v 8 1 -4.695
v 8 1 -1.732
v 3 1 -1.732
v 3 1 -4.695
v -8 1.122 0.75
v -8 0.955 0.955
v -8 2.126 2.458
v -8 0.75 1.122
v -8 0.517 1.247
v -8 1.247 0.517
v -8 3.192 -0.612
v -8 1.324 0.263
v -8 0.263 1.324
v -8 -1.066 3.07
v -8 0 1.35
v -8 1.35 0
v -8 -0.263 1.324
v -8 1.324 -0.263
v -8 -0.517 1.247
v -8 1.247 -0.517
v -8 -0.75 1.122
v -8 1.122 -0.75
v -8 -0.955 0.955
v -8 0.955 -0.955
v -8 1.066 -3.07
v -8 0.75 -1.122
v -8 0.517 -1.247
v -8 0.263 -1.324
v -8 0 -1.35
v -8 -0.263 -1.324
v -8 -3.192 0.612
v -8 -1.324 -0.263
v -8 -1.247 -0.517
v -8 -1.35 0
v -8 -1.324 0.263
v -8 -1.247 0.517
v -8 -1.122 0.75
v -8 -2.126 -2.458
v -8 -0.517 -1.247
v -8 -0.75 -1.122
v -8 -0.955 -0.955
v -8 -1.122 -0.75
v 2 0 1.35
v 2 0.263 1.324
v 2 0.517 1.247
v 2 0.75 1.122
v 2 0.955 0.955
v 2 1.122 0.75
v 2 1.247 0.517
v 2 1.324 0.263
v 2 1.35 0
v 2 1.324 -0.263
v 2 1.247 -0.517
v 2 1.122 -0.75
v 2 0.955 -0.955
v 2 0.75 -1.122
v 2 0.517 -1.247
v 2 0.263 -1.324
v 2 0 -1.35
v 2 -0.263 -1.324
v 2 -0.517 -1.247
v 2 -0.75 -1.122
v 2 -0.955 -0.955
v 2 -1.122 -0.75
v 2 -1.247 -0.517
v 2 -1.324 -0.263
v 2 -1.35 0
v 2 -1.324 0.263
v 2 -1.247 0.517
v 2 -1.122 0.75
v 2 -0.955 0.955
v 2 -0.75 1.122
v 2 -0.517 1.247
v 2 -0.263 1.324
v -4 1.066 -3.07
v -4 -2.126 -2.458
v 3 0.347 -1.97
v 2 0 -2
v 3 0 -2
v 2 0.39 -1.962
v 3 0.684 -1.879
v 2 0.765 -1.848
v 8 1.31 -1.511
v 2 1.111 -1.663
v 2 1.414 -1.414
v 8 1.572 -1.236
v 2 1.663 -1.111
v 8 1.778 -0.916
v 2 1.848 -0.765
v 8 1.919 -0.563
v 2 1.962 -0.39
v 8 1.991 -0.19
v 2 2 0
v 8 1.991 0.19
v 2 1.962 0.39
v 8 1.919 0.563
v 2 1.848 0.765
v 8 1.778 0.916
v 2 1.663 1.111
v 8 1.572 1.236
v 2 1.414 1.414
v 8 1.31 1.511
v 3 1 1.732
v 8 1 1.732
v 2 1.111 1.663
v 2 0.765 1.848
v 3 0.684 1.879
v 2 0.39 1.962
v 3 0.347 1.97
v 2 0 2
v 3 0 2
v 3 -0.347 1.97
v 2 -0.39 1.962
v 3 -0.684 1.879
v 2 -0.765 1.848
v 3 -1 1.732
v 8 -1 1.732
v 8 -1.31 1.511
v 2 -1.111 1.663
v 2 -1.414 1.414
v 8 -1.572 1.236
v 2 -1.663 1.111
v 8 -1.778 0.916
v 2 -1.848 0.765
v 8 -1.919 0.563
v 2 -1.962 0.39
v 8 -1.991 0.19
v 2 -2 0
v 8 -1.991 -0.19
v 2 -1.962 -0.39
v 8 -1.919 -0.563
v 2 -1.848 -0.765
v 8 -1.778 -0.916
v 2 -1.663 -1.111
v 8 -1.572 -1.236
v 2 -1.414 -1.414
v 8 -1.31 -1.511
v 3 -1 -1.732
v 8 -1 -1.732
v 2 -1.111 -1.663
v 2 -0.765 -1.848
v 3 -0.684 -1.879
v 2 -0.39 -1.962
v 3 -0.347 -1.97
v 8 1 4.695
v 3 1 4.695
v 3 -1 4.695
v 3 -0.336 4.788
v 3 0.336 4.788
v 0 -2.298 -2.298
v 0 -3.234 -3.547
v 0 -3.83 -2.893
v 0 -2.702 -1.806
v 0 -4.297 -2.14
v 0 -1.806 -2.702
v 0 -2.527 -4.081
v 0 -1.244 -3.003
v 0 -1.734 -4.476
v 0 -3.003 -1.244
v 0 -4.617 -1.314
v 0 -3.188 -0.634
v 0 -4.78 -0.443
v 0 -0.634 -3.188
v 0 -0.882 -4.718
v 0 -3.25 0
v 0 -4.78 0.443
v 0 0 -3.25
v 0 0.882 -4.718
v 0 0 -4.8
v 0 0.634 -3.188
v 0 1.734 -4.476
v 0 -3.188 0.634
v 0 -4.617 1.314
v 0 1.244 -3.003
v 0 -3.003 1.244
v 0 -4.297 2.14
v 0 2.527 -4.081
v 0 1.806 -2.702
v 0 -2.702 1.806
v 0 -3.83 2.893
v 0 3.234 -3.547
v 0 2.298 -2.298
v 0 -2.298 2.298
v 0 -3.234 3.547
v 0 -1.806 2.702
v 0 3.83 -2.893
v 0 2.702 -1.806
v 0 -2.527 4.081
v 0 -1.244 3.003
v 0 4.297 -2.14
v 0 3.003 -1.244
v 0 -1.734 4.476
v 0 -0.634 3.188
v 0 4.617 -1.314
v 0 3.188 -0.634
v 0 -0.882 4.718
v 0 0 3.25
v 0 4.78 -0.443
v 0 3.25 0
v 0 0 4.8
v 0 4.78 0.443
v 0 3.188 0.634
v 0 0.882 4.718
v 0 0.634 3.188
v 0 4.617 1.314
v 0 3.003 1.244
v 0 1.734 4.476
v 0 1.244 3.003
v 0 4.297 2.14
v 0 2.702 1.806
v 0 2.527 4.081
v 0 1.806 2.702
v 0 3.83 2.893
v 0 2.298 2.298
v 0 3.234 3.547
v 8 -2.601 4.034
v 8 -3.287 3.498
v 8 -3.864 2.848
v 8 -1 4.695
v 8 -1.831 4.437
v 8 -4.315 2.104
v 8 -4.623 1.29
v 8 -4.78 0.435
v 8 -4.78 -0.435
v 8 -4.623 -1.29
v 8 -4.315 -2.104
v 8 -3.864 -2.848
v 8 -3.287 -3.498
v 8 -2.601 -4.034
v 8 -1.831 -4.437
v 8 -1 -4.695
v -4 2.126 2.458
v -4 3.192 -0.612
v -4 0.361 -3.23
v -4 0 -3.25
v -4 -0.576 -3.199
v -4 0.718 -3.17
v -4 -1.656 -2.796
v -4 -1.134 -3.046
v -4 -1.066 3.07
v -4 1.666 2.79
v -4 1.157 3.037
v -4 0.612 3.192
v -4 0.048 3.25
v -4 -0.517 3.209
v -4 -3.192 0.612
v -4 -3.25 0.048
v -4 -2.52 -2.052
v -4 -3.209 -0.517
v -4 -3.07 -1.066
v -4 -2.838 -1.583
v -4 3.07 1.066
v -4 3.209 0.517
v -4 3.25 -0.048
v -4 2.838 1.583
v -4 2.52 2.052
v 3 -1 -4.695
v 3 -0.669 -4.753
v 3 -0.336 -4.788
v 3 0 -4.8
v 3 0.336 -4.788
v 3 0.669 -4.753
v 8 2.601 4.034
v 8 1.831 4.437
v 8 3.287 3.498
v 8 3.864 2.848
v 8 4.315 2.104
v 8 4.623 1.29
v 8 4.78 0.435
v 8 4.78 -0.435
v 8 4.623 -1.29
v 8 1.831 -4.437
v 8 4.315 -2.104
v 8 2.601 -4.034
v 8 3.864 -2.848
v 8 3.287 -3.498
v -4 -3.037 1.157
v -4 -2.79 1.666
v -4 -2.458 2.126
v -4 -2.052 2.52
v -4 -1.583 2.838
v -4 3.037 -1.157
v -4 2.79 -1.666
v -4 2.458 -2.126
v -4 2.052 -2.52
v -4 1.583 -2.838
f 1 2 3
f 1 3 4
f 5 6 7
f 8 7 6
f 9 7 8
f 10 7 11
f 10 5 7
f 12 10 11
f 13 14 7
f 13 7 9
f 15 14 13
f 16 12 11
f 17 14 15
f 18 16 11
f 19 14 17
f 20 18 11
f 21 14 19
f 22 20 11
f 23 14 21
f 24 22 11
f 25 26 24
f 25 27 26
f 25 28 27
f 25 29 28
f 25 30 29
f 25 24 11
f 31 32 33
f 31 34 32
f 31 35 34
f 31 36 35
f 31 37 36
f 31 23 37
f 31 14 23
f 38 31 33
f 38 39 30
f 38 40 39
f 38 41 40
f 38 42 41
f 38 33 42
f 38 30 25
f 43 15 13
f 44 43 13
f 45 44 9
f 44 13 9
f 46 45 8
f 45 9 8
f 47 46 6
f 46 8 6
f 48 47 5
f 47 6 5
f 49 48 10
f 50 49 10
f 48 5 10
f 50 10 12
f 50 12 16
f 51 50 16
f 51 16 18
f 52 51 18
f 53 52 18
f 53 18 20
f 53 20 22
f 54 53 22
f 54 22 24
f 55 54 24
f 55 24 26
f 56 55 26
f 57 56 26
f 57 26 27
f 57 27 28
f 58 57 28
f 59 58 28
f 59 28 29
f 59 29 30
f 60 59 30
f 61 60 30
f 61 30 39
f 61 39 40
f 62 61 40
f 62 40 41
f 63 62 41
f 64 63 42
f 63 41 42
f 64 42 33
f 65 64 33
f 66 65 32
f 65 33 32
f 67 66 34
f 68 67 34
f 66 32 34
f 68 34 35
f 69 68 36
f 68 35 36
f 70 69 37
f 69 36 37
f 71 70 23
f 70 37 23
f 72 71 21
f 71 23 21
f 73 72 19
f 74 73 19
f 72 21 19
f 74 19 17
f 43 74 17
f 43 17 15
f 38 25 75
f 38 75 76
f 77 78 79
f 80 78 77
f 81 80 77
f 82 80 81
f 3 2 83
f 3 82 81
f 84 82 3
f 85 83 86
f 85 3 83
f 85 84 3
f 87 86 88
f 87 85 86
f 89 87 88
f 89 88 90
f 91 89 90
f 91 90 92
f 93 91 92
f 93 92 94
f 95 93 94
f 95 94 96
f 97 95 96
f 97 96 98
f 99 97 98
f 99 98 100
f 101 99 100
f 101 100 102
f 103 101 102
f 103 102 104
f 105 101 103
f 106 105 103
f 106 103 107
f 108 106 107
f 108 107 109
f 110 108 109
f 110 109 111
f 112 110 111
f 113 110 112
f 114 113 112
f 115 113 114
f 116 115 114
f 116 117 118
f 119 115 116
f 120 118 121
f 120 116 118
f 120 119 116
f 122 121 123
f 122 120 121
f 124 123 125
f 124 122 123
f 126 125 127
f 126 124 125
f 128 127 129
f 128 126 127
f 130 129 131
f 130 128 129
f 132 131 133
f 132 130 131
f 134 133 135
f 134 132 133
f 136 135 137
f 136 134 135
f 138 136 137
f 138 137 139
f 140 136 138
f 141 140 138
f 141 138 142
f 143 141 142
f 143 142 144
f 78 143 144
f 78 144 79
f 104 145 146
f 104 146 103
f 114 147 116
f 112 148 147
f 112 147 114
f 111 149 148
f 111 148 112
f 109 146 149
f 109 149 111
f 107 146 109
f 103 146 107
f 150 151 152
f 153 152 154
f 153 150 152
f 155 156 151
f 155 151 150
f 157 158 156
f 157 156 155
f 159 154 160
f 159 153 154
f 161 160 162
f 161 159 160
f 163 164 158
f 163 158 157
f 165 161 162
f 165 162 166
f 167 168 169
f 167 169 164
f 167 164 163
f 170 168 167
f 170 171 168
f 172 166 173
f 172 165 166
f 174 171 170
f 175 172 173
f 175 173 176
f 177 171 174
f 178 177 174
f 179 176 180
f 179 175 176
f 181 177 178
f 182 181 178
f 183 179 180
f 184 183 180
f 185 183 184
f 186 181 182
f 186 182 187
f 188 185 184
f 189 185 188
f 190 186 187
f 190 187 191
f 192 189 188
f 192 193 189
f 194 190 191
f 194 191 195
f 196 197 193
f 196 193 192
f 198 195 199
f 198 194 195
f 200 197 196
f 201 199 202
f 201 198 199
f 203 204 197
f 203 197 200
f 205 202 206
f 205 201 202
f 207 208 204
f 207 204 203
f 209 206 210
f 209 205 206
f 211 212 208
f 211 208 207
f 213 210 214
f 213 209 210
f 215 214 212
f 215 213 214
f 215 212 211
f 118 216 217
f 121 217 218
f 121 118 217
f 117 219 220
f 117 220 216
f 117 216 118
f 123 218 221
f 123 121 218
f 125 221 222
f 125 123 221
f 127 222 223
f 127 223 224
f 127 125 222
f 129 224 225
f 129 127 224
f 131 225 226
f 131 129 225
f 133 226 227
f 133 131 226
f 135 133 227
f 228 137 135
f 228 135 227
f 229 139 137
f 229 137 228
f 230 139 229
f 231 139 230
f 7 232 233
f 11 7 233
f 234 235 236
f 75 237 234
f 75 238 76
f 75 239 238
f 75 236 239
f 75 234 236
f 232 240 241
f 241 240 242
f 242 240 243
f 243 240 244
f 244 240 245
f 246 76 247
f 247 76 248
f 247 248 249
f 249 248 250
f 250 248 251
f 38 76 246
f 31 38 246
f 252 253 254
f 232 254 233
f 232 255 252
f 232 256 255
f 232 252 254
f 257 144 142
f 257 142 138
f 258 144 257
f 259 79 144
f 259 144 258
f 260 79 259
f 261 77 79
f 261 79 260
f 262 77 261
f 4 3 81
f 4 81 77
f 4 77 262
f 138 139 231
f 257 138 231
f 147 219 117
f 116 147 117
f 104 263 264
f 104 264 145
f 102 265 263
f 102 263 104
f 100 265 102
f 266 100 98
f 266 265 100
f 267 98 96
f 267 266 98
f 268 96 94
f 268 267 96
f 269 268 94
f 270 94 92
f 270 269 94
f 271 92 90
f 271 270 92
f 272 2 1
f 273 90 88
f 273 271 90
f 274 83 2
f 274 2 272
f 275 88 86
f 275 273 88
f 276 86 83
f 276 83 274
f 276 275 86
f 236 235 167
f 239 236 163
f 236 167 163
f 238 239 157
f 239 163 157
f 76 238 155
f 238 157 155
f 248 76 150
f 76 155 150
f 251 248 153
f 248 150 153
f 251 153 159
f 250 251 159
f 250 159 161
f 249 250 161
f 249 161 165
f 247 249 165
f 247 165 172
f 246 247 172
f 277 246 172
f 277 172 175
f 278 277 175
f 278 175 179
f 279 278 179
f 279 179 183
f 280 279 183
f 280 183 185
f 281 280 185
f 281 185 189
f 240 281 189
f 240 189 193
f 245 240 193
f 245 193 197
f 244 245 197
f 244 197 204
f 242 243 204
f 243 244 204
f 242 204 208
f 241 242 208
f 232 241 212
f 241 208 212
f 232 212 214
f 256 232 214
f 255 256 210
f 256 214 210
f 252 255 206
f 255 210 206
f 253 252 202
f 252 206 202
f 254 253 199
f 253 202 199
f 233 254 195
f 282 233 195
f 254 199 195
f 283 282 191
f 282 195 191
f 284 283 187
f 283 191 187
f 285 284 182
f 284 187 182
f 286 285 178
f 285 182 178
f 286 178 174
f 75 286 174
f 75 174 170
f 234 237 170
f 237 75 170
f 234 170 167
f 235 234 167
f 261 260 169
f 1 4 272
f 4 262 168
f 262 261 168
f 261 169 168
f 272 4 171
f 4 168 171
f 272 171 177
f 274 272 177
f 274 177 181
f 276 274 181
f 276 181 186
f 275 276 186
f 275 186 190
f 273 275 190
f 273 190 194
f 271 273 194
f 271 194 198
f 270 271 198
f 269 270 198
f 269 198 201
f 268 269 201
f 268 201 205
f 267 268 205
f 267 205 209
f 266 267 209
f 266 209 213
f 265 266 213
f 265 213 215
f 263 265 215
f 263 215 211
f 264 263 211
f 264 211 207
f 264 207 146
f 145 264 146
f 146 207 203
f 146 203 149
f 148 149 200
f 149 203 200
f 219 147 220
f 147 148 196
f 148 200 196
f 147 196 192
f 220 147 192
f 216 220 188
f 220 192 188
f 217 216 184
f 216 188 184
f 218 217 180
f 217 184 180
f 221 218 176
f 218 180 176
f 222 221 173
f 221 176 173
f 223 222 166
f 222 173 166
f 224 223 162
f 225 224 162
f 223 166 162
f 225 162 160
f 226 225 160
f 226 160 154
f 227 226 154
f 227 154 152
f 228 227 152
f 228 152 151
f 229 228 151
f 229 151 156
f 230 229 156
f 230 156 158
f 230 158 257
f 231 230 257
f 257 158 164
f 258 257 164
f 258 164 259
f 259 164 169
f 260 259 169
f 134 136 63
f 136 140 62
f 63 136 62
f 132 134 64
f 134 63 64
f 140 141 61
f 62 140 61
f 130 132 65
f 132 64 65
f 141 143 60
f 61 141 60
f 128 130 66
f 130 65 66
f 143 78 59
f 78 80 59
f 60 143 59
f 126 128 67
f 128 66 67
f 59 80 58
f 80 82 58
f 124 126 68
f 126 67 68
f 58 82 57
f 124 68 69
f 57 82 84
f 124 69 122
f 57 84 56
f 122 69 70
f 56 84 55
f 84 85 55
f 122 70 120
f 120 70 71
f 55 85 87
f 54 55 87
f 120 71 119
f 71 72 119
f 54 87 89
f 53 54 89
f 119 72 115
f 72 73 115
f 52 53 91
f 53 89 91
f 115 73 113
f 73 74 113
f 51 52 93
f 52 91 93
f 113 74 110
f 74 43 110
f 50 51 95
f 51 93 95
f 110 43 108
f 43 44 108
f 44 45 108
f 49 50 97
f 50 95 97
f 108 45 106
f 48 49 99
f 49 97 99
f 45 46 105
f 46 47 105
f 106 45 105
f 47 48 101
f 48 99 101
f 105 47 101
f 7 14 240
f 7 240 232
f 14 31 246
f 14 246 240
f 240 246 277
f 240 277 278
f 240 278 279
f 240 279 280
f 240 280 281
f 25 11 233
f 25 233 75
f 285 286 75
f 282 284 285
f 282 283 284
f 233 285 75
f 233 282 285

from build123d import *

# Parameters (mm, degrees)
SKETCH_1_R          = 4.8
SKETCH_1_R_2        = 2
EXTRUDE_1_DEPTH     = 8
SKETCH_2_W          = 12
SKETCH_2_H          = 2
CUT_EXTRUDE_1_DEPTH = 5
SKETCH_7_R          = 2
EXTRUDE_4_DEPTH     = 2
SKETCH_8_R          = 3.25
EXTRUDE_5_DEPTH     = 8
SKETCH_9_R          = 1.35
CUT_EXTRUDE_3_DEPTH = 18.380448786
SKETCH_10_OUTSIDE_W = 15.796
SKETCH_10_OUTSIDE_H = 15.796
CUT_EXTRUDE_4_DEPTH = 4


with BuildPart() as part:
    # 草图1 → 凸台-拉伸1 (new body)
    with BuildSketch(Plane(origin=(0, 0, 0), x_dir=(0, 0, -1), z_dir=(1, 0, 0))):
        Circle(SKETCH_1_R)
        Circle(SKETCH_1_R_2, mode=Mode.SUBTRACT)
    extrude(amount=EXTRUDE_1_DEPTH)

    # 草图2 → 切除-拉伸1 (cut)
    with BuildSketch(Plane(origin=(8, 0, 0), x_dir=(0, 0, -1), z_dir=(1, 0, 0))):
        with Locations((0.025285626, 0)):
            Rectangle(SKETCH_2_W, SKETCH_2_H)
    extrude(amount=-CUT_EXTRUDE_1_DEPTH, mode=Mode.SUBTRACT)

    # 草图7 → 凸台-拉伸4 (add)
    with BuildSketch(Plane.ZY):
        Circle(SKETCH_7_R)
    extrude(amount=-EXTRUDE_4_DEPTH)

    # 草图8 → 凸台-拉伸5 (add)
    with BuildSketch(Plane.ZY):
        with Locations(Location((0, 0, 0), (0, 0, 180))):
            Circle(SKETCH_8_R)
    extrude(amount=EXTRUDE_5_DEPTH)

    # 草图9 → 切除-拉伸3 (cut, through all)
    with BuildSketch(Plane.ZY.offset(8)):
        Circle(SKETCH_9_R)
    extrude(amount=-CUT_EXTRUDE_3_DEPTH, mode=Mode.SUBTRACT)

    # 草图10 outside → 切除-拉伸4 (cut)
    with BuildSketch(Plane.ZY.offset(8)):
        Rectangle(SKETCH_10_OUTSIDE_W, SKETCH_10_OUTSIDE_H)
        Polygon((-3.070099371, 1.066297262), (-2.458490203, -2.125635416), (0.611609168, -3.191932679), (3.070099371, -1.066297262), (2.458490203, 2.125635416), (-0.611609168, 3.191932679), align=None, mode=Mode.SUBTRACT)
    extrude(amount=-CUT_EXTRUDE_4_DEPTH, mode=Mode.SUBTRACT)


solid = part.part
